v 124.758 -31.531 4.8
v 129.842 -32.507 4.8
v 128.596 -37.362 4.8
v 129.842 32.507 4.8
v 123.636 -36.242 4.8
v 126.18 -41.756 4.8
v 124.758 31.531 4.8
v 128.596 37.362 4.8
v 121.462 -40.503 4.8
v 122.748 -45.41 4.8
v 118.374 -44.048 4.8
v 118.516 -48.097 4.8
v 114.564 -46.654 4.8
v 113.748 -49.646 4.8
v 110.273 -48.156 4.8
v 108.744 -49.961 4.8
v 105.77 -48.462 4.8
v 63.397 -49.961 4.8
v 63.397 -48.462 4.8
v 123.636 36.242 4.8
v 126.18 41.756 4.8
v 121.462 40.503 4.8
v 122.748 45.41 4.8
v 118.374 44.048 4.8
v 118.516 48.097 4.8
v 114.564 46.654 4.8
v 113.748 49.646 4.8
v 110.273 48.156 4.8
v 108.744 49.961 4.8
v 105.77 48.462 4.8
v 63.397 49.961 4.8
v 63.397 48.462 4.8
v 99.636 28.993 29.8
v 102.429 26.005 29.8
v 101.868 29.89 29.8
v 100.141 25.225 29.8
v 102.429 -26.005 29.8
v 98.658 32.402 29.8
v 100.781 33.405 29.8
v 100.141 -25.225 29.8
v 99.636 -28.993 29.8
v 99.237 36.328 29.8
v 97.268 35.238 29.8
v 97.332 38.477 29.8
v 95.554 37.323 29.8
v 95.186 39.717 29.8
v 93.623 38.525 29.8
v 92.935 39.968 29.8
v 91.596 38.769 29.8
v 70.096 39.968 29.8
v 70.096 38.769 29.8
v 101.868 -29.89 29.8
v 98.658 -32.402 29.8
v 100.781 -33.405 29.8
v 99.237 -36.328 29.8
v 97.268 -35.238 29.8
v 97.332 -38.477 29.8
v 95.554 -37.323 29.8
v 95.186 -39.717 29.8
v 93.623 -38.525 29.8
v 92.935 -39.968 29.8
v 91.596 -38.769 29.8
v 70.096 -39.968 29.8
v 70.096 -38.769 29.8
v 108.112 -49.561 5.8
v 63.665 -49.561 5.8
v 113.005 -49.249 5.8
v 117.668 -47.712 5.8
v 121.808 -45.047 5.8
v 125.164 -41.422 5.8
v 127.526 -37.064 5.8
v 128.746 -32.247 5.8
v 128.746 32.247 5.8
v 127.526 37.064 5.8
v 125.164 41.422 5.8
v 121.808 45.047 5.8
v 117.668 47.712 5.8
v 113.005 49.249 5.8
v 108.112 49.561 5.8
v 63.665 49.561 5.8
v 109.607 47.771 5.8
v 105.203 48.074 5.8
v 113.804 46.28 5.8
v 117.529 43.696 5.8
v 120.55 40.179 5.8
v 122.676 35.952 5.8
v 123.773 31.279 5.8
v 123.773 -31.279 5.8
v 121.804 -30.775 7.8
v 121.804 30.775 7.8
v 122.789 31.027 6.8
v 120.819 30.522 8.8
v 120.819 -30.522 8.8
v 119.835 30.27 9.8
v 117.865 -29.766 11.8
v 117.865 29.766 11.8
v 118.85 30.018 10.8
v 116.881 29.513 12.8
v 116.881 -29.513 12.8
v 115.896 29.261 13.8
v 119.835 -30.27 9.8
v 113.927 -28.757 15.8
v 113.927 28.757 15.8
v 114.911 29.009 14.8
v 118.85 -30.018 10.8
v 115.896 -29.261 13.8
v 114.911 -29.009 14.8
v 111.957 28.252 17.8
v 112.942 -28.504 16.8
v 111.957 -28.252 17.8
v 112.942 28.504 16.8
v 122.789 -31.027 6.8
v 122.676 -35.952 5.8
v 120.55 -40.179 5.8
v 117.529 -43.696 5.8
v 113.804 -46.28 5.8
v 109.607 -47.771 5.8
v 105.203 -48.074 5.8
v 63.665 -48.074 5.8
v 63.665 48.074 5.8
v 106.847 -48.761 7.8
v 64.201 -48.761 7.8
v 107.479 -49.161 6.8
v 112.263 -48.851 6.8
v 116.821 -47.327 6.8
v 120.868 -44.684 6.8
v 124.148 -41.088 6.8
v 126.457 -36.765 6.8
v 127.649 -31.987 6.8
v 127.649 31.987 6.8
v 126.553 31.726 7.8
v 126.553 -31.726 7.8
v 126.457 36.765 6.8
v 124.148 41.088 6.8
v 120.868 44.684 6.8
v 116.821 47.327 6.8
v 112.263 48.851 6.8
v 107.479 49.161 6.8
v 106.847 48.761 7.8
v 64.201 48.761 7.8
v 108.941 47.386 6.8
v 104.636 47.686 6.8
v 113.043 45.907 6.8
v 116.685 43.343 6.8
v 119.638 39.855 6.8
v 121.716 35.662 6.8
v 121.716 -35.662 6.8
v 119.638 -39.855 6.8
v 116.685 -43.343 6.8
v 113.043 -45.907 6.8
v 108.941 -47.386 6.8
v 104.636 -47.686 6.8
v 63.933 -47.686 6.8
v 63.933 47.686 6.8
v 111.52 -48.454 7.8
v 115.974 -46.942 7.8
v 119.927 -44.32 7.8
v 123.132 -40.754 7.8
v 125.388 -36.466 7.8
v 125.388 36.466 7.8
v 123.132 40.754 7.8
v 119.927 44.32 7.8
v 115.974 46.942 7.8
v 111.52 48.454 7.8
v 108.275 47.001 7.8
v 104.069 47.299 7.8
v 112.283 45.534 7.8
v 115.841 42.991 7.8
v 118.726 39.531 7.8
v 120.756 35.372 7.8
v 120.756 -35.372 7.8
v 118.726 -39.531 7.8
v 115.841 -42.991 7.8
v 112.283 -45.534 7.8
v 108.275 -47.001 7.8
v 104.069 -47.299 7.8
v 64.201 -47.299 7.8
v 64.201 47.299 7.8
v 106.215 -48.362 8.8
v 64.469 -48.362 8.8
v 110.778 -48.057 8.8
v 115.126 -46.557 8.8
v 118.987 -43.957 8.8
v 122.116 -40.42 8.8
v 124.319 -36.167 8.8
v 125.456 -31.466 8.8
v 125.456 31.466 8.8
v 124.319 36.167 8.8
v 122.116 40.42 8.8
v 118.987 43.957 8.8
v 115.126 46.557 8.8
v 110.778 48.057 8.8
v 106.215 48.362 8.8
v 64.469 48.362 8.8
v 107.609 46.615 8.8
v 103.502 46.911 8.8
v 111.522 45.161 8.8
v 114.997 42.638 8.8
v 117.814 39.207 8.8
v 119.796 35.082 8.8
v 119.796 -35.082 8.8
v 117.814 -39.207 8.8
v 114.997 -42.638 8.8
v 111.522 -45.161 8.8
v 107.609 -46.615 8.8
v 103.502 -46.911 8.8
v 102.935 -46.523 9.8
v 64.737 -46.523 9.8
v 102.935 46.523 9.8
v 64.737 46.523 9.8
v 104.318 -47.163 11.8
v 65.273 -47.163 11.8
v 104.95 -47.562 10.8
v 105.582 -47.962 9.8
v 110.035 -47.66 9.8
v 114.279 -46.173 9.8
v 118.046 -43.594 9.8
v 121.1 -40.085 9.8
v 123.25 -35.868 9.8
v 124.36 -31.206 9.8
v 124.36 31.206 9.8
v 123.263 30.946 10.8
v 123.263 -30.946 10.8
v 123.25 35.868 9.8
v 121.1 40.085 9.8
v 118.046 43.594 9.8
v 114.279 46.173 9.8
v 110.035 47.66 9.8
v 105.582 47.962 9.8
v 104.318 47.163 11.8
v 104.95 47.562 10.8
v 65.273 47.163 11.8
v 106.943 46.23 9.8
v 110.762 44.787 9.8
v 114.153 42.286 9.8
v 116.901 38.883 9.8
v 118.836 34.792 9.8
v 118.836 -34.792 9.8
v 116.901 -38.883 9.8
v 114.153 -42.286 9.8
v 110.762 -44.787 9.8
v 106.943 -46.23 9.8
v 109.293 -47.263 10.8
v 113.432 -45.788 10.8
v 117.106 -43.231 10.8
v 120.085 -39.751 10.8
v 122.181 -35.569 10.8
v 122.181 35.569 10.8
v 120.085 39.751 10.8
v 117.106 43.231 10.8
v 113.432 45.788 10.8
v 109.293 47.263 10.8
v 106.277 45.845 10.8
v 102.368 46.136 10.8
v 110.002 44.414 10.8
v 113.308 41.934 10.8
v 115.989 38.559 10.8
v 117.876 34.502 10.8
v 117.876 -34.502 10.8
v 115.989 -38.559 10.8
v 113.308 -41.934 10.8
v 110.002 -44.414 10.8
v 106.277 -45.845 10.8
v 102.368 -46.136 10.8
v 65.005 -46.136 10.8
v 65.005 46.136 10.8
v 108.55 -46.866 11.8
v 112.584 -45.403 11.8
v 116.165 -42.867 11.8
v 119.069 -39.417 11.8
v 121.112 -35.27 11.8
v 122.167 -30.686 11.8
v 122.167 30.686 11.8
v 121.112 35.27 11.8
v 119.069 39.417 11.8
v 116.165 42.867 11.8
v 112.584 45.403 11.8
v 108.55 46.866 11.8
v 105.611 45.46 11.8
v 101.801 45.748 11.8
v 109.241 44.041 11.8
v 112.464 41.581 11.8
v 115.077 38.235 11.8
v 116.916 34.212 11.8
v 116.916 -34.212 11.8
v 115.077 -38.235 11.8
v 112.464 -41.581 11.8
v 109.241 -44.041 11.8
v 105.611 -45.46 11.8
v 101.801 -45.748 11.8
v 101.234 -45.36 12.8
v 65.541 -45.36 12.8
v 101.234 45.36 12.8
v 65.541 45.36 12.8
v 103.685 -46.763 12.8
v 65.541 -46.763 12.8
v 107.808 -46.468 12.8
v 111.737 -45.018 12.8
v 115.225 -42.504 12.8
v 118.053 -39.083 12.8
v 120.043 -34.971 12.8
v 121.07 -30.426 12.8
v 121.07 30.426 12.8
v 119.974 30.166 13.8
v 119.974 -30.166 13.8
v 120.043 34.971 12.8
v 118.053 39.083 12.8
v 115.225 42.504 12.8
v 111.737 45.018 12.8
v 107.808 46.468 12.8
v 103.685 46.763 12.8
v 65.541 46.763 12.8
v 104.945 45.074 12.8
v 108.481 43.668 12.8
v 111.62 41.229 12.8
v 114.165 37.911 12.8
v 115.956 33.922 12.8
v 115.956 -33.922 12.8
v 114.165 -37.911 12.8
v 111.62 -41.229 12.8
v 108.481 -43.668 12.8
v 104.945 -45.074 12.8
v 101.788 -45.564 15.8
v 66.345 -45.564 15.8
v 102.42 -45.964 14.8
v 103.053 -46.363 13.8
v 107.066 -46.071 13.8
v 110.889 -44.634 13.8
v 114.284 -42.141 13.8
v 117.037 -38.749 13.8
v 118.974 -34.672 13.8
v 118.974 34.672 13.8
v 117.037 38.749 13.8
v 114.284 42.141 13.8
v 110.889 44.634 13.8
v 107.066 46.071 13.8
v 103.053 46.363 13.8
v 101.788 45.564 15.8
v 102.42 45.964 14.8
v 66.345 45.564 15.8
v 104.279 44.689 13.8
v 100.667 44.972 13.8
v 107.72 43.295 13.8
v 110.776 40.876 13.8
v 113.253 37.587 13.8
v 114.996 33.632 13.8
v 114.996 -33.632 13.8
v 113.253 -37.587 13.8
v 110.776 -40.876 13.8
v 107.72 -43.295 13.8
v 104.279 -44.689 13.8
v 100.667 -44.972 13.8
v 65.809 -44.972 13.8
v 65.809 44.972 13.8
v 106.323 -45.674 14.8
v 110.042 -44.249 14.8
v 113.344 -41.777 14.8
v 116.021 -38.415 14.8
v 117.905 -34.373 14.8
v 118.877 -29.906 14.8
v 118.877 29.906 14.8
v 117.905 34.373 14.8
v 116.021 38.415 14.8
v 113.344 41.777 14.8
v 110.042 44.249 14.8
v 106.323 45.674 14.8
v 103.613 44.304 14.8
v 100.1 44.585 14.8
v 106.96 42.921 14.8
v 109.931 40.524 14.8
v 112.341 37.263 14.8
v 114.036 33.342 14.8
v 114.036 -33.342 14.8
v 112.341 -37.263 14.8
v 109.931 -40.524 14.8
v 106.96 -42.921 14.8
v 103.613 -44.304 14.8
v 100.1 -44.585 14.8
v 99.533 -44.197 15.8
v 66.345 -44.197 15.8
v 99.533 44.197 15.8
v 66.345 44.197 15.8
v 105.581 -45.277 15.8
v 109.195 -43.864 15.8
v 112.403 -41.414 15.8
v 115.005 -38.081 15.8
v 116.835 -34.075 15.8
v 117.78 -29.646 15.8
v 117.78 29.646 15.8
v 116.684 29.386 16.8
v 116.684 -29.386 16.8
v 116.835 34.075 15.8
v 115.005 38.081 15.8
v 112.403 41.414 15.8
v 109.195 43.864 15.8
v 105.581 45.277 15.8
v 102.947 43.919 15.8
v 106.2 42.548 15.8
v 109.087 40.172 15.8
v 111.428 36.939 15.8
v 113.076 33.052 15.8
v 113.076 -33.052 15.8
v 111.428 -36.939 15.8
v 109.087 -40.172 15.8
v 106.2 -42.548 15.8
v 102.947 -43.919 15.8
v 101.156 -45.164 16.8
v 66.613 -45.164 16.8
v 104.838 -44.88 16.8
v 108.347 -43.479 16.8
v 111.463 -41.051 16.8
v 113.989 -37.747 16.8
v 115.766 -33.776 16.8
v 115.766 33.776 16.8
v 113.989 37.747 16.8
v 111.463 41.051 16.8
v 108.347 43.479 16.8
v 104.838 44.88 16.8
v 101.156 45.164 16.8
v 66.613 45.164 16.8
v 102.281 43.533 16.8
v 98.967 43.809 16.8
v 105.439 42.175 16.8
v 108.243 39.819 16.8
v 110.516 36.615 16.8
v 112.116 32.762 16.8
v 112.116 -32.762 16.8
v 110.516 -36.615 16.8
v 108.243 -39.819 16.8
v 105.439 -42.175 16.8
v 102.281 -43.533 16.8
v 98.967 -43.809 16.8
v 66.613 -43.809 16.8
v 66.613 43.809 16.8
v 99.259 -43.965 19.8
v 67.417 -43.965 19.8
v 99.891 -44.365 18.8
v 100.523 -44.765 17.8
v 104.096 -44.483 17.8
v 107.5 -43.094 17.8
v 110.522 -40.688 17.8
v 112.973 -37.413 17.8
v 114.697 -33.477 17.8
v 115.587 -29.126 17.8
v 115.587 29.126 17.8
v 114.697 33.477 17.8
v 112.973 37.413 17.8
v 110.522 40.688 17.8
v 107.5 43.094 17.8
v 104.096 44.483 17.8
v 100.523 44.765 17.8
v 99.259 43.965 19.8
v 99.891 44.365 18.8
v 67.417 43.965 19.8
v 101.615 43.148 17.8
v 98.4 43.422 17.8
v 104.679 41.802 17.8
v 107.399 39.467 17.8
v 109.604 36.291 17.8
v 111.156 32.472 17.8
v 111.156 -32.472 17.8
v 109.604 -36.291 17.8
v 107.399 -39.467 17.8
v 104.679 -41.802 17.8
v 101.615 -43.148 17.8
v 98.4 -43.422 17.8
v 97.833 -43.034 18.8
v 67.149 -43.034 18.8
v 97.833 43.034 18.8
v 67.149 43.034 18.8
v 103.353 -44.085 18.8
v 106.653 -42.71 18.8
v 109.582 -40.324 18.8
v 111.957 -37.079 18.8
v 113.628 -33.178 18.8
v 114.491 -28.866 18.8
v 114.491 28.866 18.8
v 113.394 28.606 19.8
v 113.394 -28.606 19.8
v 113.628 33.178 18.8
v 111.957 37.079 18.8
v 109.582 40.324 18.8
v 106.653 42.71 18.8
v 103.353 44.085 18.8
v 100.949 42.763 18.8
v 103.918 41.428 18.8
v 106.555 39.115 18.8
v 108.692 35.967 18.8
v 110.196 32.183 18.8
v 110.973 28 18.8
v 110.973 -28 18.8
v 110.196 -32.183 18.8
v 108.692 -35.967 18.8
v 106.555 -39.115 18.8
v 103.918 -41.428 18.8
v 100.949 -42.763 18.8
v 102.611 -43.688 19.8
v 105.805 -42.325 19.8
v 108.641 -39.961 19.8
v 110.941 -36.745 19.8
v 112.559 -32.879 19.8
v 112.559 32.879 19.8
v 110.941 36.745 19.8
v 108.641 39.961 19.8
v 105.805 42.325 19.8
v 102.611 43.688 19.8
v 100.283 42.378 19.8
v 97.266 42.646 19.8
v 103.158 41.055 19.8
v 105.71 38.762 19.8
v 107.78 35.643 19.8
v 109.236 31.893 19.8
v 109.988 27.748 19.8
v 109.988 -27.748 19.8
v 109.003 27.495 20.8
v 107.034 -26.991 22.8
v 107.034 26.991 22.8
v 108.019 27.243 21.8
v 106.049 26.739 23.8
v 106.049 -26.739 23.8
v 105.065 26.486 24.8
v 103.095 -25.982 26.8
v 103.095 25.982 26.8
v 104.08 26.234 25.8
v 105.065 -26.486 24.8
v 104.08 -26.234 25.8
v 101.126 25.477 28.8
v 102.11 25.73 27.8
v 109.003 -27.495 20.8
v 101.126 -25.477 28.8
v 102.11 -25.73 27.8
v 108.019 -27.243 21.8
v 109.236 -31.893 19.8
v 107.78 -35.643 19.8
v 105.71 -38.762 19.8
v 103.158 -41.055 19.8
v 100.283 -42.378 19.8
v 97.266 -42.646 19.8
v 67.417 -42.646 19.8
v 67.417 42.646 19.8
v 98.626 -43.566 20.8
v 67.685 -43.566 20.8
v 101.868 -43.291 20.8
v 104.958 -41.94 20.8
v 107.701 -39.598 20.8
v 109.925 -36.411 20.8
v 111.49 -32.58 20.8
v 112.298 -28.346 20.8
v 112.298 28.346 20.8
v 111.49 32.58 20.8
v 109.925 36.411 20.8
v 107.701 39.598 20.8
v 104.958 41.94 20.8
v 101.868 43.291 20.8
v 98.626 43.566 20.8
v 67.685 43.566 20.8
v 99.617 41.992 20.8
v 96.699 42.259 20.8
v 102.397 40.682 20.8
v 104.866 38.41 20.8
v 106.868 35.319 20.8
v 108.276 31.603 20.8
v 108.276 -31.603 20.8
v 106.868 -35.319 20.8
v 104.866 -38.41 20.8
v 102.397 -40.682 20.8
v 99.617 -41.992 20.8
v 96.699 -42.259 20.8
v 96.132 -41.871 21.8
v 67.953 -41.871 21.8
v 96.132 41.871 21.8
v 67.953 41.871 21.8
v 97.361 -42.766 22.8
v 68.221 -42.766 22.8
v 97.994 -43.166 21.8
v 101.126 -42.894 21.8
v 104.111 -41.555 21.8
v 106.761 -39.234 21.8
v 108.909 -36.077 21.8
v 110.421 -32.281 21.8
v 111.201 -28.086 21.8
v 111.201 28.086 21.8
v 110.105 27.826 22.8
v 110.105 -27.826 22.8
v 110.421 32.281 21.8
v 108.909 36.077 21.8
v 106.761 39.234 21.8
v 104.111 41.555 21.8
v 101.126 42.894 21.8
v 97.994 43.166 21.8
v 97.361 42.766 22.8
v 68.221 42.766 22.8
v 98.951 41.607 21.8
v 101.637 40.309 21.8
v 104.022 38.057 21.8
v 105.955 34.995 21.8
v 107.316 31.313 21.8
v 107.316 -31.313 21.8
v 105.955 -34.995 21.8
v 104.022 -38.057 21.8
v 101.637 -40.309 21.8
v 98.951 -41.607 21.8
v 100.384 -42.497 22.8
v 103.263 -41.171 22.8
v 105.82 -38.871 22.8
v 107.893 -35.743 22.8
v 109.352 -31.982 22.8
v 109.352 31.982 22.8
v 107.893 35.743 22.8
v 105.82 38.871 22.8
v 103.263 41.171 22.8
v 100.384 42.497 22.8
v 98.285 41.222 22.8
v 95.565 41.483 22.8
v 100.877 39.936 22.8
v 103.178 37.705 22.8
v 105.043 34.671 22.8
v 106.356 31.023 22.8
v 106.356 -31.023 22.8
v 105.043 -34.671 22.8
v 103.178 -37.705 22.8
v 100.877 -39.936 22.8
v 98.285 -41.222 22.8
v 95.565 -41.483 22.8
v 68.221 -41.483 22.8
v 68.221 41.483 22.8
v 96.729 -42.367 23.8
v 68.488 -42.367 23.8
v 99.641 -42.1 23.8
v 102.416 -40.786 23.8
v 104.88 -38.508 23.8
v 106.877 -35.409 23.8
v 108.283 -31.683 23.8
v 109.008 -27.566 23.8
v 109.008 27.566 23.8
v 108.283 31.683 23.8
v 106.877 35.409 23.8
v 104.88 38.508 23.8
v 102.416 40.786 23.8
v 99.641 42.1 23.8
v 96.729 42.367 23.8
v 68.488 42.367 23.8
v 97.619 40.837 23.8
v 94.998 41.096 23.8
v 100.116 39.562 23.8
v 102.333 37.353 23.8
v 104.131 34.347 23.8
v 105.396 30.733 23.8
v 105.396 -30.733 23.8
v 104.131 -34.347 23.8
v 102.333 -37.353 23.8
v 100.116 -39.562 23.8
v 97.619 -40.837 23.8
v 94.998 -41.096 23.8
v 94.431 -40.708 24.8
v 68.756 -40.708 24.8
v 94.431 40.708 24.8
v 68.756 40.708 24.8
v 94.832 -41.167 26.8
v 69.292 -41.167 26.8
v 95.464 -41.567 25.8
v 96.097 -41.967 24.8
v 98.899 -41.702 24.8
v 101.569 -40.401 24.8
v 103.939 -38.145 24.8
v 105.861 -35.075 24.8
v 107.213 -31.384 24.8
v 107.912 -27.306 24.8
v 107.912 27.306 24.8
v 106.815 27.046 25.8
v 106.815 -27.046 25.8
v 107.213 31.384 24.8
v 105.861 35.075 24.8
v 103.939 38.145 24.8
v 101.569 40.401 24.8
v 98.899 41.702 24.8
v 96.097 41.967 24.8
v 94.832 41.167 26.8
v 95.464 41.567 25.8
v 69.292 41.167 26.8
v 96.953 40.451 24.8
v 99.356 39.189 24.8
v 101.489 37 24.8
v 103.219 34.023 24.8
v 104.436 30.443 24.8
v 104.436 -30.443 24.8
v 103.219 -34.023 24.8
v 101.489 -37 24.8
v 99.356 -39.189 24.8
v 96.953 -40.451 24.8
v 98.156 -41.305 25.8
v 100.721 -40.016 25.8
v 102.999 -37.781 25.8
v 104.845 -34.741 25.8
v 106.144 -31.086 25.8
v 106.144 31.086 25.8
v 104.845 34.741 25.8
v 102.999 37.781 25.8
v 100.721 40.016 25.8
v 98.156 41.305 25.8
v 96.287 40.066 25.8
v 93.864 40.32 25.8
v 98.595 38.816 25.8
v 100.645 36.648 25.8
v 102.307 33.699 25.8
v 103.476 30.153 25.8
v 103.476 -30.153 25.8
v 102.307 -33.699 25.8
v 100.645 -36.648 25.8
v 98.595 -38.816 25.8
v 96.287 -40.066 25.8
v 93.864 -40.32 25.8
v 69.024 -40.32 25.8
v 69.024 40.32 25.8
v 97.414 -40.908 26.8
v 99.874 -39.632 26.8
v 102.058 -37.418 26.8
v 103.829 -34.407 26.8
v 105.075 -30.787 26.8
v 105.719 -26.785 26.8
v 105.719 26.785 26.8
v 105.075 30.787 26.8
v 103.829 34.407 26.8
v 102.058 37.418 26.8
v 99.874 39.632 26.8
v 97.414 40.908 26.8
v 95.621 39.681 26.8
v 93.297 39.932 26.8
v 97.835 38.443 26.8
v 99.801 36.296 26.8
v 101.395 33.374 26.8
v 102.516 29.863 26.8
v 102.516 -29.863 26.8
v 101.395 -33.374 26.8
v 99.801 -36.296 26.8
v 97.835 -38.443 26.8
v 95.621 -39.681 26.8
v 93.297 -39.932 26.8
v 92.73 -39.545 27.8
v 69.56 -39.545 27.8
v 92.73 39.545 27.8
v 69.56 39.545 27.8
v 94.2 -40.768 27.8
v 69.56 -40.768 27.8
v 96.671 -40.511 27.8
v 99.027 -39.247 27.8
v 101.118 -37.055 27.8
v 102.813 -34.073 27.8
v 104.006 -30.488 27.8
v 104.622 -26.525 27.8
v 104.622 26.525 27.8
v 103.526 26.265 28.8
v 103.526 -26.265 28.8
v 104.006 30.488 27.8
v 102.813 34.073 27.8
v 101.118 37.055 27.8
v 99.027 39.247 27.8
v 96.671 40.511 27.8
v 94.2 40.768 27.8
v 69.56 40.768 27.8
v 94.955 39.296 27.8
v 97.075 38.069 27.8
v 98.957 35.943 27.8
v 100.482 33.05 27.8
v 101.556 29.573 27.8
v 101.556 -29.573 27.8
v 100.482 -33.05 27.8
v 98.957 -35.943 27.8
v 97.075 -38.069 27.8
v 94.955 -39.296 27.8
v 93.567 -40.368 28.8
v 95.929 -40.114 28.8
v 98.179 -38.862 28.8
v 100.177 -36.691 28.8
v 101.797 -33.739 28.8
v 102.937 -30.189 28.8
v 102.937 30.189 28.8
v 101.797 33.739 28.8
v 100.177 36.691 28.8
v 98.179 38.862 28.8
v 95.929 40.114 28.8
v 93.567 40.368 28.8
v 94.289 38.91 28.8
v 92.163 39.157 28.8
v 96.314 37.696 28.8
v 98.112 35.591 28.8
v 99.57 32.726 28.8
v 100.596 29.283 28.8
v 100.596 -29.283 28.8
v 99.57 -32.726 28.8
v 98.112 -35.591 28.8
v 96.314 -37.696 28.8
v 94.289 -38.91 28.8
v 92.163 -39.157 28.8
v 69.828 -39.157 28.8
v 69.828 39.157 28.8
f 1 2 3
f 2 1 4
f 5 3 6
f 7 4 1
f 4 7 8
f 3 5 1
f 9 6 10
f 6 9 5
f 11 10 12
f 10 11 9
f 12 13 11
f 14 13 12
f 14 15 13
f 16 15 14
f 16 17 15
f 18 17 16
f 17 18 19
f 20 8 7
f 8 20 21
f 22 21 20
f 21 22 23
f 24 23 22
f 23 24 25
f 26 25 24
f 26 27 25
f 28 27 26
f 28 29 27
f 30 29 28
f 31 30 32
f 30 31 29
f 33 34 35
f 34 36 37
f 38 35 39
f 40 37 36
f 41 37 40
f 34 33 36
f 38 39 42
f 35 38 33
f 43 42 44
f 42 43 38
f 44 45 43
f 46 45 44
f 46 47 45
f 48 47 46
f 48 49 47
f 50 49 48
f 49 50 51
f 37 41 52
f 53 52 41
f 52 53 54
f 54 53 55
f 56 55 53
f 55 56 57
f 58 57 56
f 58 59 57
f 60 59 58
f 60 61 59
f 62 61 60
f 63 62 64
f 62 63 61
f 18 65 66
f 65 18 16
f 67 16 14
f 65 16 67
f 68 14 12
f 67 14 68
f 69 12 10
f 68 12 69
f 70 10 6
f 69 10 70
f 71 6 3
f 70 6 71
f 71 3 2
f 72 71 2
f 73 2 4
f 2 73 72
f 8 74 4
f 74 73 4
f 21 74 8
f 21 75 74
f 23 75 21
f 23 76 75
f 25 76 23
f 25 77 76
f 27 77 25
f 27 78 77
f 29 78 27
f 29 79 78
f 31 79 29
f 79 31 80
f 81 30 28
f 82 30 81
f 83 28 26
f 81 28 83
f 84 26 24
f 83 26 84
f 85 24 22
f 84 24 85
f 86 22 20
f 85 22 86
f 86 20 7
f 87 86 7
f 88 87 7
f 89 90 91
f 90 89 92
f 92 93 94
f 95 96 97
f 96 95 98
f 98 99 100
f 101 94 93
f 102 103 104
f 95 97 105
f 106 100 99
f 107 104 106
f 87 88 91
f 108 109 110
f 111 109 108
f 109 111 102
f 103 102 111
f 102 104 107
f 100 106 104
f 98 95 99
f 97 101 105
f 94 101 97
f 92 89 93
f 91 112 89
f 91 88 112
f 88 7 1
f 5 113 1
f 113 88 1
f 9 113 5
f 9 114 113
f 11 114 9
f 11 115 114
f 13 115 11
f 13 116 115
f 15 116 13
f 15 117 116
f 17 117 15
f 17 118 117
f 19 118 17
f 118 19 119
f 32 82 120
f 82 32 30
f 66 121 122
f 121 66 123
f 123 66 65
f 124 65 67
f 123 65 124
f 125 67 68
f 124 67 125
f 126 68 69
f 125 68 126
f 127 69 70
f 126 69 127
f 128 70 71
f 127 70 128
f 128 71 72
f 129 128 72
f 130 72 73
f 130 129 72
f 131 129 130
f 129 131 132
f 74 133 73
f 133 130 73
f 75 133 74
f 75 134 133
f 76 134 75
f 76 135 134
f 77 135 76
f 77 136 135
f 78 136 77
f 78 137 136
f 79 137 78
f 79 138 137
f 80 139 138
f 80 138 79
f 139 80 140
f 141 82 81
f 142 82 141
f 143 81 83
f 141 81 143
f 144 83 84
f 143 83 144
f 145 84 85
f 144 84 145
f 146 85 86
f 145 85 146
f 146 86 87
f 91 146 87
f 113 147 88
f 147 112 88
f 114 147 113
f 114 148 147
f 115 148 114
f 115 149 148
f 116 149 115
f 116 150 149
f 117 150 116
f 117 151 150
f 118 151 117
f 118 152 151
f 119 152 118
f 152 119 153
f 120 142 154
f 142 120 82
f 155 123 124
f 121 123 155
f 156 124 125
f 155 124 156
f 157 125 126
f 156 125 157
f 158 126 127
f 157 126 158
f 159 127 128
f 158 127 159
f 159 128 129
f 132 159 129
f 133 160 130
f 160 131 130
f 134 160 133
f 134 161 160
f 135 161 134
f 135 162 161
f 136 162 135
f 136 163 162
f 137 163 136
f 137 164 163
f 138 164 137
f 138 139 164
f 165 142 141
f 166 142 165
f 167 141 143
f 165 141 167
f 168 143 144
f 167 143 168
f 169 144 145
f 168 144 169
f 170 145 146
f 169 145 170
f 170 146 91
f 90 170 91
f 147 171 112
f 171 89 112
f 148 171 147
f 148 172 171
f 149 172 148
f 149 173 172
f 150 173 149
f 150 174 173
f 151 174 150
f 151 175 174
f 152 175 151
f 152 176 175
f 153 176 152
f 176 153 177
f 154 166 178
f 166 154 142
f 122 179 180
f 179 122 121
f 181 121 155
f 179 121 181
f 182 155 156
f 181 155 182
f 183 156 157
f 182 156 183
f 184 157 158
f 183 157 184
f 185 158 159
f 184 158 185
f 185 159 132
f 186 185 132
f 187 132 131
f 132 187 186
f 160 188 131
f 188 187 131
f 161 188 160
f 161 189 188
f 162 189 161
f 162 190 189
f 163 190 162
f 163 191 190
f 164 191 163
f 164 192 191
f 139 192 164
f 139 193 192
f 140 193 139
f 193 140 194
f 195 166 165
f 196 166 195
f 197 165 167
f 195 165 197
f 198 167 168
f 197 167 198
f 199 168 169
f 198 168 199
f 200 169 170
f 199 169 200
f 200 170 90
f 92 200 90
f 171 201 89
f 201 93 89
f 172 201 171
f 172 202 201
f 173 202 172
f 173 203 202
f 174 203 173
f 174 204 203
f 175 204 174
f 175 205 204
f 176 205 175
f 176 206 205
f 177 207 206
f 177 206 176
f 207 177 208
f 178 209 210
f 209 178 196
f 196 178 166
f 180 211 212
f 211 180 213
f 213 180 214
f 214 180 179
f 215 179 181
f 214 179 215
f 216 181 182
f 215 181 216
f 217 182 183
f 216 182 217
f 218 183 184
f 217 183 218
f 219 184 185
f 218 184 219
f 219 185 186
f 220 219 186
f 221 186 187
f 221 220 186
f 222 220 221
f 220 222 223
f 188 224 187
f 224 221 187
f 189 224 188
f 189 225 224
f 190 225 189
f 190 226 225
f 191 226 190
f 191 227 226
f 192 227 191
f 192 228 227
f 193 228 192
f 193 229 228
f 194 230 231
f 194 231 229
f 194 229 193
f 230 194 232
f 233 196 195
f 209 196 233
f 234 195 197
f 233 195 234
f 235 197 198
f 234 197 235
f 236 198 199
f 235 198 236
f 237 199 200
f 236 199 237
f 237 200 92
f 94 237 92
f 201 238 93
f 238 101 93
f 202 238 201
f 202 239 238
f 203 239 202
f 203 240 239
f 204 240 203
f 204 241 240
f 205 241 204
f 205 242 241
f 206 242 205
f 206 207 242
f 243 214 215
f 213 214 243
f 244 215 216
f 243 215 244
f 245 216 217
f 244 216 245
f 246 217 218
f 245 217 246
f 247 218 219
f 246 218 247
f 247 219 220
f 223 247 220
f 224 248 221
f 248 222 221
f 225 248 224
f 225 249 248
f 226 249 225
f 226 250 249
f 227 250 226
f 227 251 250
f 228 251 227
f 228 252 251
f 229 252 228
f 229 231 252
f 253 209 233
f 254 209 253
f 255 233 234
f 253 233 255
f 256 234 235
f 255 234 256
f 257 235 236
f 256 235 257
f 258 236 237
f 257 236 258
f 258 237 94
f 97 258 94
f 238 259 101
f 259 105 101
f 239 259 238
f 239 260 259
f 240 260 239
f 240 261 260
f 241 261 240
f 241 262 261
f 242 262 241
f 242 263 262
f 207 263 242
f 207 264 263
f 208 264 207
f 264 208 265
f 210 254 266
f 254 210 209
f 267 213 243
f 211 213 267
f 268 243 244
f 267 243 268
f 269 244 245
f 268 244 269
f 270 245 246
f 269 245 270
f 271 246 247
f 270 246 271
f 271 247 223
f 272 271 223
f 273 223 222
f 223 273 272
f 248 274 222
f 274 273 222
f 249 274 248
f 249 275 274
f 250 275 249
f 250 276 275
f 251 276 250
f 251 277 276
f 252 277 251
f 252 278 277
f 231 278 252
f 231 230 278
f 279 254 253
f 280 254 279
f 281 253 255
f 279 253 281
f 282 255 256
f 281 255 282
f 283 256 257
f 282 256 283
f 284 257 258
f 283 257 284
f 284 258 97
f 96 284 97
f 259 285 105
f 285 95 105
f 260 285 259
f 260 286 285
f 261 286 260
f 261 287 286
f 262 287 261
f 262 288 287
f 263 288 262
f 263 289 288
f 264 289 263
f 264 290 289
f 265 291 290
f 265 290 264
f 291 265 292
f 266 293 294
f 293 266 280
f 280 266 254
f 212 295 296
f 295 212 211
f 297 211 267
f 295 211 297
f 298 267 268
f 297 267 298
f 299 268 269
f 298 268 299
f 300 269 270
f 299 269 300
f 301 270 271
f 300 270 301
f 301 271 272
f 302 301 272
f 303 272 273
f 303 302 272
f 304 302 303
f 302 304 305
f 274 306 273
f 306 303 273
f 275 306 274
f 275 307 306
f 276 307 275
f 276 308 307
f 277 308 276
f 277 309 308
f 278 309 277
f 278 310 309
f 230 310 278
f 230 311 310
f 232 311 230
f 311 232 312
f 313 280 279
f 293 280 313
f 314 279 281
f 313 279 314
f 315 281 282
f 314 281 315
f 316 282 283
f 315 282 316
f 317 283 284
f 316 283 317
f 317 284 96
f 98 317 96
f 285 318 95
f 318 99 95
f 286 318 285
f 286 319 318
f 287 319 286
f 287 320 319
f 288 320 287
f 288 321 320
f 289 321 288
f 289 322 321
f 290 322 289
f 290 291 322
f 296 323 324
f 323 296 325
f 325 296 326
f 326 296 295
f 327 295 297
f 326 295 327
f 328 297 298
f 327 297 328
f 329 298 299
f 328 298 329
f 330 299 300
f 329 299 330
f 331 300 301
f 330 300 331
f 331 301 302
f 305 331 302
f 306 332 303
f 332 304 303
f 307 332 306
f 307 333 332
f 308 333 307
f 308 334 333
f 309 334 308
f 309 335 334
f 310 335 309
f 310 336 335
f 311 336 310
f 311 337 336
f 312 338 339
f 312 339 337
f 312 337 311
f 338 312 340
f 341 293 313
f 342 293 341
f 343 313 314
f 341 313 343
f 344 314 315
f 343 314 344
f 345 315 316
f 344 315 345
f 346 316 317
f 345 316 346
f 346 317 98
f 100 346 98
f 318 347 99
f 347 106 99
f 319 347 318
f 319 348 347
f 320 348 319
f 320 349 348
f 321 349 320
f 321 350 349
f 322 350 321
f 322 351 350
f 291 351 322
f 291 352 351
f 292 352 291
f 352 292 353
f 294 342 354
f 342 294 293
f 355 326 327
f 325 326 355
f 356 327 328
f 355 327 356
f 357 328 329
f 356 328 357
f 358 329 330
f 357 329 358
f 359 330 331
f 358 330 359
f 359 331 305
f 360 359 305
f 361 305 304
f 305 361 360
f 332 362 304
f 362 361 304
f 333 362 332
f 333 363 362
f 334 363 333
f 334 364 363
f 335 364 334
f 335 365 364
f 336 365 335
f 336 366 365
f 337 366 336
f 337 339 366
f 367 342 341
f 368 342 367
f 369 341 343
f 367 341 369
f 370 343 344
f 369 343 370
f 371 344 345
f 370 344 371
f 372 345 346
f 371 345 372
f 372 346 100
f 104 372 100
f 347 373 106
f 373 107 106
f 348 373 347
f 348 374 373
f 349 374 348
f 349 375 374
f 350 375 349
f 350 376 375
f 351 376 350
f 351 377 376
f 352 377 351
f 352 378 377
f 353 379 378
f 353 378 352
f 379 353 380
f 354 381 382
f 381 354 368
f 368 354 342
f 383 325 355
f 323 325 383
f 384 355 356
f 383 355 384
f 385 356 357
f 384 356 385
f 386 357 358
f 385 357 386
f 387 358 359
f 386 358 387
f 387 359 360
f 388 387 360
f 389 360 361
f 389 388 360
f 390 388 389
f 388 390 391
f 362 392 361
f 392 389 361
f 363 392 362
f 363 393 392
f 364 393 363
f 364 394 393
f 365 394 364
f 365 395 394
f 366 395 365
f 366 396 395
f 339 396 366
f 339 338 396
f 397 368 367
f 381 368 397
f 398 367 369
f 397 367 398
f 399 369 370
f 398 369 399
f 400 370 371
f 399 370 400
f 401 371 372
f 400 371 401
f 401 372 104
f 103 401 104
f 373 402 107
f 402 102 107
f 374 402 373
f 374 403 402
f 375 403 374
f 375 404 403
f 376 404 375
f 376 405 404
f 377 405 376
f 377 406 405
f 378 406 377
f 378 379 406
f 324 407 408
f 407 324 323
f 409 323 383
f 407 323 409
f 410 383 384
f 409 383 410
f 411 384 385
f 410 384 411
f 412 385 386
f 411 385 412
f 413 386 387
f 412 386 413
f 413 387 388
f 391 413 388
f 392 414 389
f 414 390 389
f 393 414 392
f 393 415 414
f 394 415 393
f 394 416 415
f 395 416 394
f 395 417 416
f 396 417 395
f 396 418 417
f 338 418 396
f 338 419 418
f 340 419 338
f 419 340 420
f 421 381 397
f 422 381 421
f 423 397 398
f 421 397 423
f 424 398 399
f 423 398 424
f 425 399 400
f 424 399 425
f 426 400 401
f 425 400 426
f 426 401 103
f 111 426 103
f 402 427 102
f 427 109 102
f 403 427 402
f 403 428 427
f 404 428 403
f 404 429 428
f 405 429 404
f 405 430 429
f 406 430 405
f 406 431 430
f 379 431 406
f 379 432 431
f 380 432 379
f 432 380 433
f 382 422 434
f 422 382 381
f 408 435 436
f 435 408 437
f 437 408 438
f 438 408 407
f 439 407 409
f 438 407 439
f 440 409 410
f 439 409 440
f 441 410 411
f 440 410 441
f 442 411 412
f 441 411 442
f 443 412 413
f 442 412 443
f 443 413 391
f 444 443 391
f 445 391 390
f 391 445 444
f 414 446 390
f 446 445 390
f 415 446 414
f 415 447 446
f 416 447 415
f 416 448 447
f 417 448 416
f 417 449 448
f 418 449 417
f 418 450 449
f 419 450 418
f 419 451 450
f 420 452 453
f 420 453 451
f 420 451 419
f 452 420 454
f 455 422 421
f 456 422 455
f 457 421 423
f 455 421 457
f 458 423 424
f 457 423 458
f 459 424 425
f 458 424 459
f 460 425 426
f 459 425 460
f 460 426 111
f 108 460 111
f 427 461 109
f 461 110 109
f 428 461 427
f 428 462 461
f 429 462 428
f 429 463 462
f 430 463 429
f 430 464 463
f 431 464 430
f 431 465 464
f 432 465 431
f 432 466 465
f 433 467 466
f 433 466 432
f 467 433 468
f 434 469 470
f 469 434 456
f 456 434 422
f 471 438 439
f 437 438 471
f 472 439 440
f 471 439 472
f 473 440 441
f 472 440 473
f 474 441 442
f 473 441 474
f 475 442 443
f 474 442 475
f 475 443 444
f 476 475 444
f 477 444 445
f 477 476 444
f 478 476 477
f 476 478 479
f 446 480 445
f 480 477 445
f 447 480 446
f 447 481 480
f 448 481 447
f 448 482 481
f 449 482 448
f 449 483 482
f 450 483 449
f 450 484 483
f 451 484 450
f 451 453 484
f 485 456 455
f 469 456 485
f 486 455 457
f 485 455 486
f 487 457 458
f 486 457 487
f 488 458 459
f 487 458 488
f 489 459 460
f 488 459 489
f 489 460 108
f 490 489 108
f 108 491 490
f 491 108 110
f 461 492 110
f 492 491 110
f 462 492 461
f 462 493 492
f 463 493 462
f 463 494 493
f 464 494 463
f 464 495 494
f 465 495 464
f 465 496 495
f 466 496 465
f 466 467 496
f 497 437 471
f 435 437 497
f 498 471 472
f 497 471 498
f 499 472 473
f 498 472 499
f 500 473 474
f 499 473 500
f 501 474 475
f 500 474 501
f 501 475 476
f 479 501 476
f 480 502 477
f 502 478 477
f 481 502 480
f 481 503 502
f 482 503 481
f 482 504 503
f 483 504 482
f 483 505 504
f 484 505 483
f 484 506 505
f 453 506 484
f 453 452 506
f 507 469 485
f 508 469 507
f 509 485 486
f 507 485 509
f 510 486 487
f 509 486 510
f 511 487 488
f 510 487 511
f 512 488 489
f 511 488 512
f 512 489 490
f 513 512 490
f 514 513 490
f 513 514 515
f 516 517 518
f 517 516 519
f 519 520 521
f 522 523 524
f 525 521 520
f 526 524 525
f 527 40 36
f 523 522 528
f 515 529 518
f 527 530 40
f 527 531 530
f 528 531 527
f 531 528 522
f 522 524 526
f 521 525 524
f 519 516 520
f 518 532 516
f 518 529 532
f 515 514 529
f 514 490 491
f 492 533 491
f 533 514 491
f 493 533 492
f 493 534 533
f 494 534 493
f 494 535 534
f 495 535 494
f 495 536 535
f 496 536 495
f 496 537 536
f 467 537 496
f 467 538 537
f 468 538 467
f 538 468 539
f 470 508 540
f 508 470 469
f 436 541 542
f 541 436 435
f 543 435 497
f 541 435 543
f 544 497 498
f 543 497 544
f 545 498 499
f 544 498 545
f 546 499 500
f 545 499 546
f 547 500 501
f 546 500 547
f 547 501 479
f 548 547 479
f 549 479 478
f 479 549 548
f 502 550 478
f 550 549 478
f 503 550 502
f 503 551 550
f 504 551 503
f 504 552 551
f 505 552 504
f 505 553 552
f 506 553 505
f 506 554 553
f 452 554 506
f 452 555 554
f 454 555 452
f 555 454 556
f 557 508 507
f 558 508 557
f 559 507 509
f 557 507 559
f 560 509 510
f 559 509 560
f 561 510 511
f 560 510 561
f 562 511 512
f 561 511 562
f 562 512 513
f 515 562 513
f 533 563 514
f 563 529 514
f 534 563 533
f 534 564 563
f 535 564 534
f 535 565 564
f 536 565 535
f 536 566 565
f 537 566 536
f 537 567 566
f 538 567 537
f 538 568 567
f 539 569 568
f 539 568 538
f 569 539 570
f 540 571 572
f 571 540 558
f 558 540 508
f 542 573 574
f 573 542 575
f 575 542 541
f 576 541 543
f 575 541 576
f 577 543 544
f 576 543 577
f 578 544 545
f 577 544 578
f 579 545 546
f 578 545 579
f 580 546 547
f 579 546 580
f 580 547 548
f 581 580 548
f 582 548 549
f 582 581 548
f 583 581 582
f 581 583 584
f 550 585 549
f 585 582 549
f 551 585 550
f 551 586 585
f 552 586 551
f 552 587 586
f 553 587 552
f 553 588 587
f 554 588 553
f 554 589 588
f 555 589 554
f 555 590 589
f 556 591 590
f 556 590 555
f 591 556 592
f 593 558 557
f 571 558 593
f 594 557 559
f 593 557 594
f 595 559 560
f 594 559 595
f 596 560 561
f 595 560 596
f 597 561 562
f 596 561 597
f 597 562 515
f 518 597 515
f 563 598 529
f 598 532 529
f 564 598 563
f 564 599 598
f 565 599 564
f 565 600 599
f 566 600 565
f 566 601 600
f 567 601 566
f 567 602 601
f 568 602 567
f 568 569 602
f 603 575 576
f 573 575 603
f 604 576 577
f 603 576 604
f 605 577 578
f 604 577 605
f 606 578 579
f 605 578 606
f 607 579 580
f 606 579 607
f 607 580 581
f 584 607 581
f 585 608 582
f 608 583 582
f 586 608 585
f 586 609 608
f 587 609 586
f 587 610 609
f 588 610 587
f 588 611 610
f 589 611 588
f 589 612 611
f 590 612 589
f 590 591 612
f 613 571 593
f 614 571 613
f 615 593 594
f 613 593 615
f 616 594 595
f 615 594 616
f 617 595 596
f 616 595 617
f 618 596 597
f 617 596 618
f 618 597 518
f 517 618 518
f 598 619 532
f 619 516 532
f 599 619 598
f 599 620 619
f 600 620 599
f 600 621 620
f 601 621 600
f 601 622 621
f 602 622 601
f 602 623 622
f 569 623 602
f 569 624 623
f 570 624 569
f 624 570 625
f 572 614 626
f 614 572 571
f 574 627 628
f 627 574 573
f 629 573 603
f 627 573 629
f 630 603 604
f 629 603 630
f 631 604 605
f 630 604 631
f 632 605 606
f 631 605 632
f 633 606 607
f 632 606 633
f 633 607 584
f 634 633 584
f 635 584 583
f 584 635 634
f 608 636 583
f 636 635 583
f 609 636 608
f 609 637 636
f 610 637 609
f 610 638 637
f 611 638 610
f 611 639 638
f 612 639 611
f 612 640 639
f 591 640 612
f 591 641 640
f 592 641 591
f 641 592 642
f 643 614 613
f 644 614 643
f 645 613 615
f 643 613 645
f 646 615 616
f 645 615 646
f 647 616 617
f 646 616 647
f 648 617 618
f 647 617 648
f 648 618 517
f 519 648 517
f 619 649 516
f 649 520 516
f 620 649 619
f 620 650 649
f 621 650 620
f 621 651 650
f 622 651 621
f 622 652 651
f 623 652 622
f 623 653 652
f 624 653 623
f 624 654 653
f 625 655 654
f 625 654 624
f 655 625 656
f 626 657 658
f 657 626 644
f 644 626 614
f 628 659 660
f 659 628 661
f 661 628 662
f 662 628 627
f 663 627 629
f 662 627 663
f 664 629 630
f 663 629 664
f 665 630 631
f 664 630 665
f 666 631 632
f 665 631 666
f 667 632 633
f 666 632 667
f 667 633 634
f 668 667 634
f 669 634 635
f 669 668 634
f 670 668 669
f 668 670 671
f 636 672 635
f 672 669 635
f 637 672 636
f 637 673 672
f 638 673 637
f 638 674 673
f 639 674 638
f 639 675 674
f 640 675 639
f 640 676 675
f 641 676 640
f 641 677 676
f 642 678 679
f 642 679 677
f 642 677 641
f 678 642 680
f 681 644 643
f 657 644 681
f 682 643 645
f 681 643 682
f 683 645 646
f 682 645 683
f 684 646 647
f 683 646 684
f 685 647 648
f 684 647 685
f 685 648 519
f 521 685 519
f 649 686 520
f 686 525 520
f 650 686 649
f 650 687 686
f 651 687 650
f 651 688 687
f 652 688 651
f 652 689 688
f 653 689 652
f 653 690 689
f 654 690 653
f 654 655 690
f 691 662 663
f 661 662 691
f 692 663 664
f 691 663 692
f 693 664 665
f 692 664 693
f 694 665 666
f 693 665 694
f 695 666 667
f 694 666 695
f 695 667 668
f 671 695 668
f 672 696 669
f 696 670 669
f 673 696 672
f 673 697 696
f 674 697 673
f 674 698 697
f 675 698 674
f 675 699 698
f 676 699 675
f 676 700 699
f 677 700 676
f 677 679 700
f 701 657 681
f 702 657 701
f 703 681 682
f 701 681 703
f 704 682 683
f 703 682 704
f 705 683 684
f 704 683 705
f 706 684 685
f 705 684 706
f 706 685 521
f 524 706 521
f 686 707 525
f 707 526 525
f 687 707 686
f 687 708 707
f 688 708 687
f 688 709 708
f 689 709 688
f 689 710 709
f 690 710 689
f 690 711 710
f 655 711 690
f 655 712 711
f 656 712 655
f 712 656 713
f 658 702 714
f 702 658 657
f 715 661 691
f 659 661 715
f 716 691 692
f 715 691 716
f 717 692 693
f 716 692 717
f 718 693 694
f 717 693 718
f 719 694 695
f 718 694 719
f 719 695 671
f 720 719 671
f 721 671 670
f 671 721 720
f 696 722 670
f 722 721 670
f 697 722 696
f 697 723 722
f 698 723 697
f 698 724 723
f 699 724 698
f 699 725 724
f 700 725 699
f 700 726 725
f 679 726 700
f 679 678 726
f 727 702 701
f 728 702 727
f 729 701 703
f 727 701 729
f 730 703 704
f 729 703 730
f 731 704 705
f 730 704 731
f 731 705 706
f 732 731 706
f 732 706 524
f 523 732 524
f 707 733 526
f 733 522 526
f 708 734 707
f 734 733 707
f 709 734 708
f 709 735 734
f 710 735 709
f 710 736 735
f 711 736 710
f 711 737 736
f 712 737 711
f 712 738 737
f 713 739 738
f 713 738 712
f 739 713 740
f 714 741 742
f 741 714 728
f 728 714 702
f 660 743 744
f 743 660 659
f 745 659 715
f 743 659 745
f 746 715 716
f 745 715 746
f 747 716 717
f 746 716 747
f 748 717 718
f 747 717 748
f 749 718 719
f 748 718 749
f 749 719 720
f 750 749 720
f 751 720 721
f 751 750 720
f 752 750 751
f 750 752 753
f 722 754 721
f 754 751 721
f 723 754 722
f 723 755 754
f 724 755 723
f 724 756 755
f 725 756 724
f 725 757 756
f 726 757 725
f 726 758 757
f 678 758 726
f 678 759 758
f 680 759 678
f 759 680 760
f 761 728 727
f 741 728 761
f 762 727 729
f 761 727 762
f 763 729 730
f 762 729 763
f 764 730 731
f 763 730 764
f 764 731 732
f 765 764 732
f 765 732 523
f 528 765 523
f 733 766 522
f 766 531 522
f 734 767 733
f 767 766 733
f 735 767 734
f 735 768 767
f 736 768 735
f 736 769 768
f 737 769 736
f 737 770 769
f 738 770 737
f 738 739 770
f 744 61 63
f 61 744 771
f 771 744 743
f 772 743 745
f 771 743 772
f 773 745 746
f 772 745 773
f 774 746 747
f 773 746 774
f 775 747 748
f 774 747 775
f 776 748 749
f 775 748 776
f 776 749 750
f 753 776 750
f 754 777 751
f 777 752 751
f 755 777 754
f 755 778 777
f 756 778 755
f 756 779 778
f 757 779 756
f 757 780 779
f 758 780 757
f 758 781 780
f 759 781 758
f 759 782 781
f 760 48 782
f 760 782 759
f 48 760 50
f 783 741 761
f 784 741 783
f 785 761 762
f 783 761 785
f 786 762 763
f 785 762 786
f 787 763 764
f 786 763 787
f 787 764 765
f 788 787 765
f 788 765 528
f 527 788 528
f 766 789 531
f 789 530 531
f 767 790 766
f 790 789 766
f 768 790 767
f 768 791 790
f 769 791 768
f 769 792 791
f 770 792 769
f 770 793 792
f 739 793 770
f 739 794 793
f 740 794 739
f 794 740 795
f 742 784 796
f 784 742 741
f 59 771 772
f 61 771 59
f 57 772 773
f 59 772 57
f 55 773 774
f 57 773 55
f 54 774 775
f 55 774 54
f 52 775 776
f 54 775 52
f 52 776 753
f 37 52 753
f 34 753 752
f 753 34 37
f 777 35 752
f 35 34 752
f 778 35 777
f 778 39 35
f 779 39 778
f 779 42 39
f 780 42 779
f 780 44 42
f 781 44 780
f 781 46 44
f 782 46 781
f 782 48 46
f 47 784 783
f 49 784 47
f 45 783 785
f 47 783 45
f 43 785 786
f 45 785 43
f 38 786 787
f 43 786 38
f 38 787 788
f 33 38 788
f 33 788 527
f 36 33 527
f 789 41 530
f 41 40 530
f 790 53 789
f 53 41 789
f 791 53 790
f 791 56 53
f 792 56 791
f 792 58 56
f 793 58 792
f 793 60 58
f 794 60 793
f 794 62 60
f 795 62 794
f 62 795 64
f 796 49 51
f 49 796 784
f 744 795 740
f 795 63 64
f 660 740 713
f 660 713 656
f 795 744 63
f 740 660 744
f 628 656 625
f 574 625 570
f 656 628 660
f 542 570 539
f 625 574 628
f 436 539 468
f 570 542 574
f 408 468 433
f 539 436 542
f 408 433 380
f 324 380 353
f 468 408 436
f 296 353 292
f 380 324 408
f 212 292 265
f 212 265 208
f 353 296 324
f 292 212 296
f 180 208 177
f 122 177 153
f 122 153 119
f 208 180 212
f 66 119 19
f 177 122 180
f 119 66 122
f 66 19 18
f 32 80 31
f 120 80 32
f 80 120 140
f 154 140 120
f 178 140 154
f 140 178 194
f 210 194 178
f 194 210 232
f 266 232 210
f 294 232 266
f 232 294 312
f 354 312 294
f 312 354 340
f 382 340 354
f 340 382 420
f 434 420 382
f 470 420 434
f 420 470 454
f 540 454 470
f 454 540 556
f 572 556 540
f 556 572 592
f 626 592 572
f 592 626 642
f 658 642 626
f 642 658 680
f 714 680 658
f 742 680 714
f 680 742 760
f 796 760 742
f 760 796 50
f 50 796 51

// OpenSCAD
depth = 74;
boat_width = 110;
oversize = 7;
thickness = 2.8;
big_eps = 0.5;

$fn=25;

d = 12;

cube_d = 24.5-7.45-d/2;

translate([0,0,--(thickness+1)]){
    //top_front();
    translate([80,0,1])rotate([0,0,180])shield();
}

module shield(){
    difference(){
        linear_extrude(25, convexity=20, scale=[0.45,0.8])
            outline();
        translate([30,-60,-50]) rotate([0,-15,0]) cube([50,120,100]);
    }
}

module outline(){
    {
        difference(){
            polovica();
            translate([0.1,0,0])scale([0.9,0.97,1])polovica();
        }
    }
}


module polovica(){
    dlzka = 30;
    sirka = 30;
    hull(){
        translate([-dlzka,sirka,0])circle(20);
        translate([-dlzka,-sirka,0])circle(20);
        translate([dlzka,sirka,0])circle(20);
        translate([dlzka,-sirka,0])circle(20);
    }
}

module top_front(){
    translate([0,0,-thickness])linear_extrude(thickness) 2d_front();
    oversized_top();
    difference(){
        translate([-14,0,-thickness/2])cube([28,110,thickness], center=true);
        scale([1.01, 1.01, 1.1])translate([-20/2-10,0,-thickness/2+0.1])cube([22,32,thickness], center=true);
    }
}

module oversized_top(){
    translate([0,0,-0.01])linear_extrude(thickness) scale([(175+oversize)/175, (boat_width+2*oversize)/boat_width, 1]) 2d_front();
}

module 2d_front(){
    projection() 
    scale([9.9,9.165,10]){
        translate([-20+cube_d,0,-1]){
            union(){
                translate([20,0,0])cylinder(20,d=d);
                translate([-cube_d/2+20,0,0])cube([cube_d,d,30], center=true);
            }
        }
    }
}
